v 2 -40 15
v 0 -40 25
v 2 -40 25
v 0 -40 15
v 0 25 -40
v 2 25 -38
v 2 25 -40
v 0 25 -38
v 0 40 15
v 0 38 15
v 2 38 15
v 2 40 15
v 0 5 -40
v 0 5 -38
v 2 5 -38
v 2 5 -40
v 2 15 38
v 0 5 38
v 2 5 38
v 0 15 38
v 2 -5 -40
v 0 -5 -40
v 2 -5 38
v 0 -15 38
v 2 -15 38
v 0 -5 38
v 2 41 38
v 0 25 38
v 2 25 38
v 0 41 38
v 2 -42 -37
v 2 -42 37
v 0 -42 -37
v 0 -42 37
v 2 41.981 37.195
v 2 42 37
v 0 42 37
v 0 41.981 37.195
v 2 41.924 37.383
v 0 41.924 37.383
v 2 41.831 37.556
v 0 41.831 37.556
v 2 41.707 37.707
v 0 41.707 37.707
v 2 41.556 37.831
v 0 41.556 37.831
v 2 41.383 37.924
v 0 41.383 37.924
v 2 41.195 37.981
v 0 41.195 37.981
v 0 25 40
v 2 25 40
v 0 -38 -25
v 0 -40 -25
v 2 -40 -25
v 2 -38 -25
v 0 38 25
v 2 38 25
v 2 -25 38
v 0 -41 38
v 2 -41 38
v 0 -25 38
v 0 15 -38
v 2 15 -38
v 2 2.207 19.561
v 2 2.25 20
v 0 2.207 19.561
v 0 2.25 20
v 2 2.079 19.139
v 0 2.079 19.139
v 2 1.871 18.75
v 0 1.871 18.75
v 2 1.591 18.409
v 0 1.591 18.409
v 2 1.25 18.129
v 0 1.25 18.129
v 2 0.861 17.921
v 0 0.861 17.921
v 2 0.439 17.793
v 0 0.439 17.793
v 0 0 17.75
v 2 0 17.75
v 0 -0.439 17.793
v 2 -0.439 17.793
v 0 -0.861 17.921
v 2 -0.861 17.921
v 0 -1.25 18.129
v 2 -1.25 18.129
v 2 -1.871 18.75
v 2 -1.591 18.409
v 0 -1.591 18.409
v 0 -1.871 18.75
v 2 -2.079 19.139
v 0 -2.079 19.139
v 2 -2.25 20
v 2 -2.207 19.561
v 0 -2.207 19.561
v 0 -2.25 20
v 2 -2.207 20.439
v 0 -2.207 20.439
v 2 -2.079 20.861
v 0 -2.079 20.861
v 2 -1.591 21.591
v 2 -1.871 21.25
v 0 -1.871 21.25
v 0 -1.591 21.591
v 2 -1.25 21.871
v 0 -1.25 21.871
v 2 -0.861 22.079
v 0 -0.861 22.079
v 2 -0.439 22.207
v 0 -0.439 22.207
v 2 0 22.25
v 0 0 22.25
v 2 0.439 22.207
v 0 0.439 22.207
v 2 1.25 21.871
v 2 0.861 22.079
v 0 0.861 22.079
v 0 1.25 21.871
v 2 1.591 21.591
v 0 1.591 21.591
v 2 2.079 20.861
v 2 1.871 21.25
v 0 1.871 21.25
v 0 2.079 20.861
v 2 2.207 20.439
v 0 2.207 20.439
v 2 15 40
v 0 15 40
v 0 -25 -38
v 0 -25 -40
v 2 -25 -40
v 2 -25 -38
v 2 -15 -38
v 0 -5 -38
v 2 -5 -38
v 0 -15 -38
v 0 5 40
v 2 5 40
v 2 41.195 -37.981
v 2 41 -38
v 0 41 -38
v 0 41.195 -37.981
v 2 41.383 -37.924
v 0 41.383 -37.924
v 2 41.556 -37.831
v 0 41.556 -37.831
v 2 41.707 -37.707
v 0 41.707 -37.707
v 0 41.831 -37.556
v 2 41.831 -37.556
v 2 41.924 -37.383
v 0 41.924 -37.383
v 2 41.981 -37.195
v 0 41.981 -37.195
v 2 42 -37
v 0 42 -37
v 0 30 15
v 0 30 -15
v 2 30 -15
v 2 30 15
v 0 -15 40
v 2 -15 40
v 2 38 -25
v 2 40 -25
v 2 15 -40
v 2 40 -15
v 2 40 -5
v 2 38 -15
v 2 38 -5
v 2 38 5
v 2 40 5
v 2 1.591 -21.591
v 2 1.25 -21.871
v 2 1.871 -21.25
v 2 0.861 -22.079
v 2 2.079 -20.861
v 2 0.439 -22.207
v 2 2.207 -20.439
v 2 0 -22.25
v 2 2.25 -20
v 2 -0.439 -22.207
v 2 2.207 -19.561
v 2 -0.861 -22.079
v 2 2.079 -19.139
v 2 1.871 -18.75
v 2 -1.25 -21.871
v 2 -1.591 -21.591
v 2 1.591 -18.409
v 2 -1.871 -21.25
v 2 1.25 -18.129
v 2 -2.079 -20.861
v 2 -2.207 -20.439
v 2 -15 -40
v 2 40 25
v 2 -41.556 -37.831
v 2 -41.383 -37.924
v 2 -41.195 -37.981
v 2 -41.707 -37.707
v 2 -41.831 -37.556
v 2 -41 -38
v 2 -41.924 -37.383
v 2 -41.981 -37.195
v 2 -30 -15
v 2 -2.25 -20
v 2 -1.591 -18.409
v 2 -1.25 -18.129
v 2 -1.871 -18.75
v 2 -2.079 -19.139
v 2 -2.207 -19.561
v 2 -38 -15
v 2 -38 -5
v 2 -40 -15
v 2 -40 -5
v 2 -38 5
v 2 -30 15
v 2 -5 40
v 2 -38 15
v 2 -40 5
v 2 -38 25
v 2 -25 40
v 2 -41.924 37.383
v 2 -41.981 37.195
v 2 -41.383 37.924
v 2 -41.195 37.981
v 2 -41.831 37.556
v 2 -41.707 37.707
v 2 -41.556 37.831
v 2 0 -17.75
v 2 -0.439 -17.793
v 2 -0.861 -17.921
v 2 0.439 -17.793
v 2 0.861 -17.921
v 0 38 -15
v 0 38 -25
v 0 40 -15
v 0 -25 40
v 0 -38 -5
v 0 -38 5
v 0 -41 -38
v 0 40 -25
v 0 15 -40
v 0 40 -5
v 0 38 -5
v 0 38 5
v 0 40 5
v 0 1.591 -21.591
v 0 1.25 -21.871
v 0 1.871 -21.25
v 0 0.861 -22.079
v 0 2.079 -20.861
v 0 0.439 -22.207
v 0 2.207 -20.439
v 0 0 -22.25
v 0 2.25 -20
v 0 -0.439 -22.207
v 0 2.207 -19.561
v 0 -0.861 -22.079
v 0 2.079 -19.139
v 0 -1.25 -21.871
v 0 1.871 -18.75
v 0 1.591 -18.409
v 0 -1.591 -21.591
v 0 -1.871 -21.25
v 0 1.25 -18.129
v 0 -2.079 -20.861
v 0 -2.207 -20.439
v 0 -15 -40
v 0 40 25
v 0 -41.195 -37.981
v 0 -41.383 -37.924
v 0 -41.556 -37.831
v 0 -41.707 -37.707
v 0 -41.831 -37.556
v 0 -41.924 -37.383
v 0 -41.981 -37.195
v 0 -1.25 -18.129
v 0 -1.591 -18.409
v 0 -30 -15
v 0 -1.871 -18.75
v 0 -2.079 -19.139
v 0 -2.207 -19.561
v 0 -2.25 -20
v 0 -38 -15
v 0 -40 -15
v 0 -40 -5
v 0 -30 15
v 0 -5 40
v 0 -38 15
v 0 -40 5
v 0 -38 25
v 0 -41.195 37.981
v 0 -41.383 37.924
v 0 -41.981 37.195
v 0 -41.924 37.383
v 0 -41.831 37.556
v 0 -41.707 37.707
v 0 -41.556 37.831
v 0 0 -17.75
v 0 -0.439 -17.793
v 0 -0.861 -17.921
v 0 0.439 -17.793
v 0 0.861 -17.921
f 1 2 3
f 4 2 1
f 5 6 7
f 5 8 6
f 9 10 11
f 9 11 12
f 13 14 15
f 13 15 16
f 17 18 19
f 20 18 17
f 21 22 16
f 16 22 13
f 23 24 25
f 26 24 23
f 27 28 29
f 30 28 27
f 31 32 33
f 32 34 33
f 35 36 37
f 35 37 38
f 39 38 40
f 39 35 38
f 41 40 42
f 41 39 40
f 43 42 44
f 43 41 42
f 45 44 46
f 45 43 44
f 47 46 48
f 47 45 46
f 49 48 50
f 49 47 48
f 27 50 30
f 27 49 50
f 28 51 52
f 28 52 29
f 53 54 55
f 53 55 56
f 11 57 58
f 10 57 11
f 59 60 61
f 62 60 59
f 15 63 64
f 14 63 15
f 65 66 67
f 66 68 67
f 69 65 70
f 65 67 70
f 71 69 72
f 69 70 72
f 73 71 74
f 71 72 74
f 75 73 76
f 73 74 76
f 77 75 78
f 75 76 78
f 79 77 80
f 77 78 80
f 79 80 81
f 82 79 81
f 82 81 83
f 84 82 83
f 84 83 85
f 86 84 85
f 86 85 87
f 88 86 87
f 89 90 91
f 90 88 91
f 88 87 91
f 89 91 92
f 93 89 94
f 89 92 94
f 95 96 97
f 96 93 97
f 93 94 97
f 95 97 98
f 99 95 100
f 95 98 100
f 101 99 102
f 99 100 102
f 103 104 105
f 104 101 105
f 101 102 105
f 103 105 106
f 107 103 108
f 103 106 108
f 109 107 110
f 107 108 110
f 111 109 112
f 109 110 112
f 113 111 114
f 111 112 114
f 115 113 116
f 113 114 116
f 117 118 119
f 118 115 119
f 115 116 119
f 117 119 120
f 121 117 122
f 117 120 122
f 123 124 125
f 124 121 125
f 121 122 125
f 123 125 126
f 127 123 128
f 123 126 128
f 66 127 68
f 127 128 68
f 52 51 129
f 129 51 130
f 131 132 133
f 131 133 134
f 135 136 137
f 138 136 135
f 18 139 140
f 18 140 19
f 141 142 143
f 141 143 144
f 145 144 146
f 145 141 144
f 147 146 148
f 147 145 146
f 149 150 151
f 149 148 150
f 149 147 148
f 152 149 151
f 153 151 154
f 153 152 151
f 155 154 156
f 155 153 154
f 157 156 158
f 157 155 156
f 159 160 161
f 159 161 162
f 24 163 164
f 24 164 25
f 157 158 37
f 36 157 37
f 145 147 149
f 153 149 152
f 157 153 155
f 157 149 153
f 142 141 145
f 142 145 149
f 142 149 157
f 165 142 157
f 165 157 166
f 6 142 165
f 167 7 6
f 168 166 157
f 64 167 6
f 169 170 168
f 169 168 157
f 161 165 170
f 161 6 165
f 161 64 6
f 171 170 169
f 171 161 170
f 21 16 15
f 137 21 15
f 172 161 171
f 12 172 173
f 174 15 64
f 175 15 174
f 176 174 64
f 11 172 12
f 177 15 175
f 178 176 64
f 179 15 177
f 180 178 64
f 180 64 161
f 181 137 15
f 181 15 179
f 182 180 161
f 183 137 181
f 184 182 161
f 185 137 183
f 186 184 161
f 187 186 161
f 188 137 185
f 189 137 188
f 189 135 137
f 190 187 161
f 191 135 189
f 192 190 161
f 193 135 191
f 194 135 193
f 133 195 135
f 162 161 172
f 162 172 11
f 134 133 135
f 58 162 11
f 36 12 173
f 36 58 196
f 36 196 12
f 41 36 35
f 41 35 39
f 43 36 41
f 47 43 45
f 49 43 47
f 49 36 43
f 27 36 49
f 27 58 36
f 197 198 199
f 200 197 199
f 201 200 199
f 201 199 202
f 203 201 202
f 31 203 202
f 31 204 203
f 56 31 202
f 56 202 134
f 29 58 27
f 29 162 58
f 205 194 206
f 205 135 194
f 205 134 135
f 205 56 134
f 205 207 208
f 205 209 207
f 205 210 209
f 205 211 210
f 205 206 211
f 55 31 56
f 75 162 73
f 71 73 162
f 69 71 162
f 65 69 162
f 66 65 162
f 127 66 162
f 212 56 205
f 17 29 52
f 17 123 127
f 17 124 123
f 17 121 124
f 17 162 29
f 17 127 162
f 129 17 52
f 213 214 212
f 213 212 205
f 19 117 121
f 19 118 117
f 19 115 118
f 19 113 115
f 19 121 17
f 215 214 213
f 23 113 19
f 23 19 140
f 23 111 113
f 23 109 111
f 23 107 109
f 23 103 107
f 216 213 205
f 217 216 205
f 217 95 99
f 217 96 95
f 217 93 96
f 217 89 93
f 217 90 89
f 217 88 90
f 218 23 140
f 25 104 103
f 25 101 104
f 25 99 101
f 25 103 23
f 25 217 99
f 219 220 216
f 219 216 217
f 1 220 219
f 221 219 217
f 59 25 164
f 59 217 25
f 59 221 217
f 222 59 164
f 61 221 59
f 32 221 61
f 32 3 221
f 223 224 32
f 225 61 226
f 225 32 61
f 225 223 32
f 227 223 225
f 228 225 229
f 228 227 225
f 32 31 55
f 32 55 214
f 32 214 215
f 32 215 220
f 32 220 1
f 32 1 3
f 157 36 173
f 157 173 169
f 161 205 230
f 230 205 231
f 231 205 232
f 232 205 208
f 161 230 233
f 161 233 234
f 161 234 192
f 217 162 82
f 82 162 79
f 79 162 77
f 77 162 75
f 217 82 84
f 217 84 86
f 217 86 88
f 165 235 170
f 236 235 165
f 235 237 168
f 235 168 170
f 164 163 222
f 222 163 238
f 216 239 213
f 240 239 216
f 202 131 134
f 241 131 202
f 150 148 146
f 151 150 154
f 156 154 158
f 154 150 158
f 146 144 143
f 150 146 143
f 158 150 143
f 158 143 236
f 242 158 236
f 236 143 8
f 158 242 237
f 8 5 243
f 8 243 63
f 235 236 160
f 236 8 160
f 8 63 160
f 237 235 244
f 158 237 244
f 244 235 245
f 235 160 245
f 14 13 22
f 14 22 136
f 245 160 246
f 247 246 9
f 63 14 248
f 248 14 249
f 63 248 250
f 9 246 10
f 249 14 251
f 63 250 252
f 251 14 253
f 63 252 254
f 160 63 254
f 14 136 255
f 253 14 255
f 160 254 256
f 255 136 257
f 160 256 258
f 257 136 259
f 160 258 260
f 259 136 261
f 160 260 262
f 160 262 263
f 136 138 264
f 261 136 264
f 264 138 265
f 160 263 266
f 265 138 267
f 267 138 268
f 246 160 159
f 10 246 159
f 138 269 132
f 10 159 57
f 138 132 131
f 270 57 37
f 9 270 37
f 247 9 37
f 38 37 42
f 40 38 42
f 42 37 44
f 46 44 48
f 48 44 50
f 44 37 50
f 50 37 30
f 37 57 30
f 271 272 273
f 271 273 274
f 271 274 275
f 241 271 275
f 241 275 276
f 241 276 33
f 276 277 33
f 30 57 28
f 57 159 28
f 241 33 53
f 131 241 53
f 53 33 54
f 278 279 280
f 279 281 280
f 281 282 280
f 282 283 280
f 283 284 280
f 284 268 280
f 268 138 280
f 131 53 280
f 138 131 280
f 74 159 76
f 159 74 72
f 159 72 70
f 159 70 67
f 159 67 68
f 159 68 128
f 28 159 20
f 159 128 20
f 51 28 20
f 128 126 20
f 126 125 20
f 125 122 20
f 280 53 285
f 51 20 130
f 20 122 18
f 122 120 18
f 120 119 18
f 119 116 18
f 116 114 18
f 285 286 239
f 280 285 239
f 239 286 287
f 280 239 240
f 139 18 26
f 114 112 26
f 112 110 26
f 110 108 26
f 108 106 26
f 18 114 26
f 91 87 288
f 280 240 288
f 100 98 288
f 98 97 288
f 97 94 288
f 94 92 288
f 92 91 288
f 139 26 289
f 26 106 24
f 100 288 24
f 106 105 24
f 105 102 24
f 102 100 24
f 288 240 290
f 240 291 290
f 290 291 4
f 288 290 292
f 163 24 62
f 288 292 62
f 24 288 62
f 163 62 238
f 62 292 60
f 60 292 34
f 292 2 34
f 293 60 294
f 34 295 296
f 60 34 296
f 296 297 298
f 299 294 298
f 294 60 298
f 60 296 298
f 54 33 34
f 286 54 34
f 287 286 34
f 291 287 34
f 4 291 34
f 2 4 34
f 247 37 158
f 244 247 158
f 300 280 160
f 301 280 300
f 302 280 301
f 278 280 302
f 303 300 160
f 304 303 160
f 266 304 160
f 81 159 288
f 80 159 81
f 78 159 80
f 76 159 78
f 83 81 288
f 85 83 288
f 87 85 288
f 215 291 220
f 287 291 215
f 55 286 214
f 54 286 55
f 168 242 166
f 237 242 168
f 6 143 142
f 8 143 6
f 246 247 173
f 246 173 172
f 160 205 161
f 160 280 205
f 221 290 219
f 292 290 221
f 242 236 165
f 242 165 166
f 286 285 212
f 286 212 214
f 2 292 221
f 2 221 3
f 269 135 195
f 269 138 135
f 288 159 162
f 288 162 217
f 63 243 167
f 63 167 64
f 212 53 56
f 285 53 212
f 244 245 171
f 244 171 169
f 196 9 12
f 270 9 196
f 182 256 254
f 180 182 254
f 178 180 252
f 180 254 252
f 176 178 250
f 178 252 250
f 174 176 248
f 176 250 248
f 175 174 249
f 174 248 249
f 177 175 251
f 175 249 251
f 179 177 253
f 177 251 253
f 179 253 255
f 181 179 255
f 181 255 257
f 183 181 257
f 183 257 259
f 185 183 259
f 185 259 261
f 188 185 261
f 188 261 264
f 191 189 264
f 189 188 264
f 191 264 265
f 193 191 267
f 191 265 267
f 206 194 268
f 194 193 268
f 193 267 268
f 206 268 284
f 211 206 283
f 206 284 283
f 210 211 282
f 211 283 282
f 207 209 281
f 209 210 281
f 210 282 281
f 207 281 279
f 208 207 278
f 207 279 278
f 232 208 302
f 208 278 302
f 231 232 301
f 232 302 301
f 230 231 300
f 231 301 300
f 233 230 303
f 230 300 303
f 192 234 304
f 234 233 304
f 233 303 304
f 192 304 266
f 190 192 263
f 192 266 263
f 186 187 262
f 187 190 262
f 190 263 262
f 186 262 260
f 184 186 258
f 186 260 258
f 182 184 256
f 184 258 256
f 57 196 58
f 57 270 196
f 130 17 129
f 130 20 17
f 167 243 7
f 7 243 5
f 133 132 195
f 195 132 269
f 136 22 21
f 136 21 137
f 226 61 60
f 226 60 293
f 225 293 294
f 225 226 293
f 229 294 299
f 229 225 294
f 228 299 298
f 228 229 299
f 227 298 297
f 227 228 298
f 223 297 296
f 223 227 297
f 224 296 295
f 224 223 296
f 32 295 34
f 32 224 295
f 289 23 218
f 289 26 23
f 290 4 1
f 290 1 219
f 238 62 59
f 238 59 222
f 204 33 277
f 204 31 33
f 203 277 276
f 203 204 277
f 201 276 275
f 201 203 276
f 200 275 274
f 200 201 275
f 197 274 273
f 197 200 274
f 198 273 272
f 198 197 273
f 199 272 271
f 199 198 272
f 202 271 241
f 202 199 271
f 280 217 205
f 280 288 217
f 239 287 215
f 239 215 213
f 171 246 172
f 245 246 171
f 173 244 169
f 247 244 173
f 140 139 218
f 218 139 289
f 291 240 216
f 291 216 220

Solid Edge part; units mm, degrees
sketch "Sketch1" plane through (0, 0, 0) normal (1, 0, 0) x (0, 1, 0)
  line L0 (42, -40) -> (42, 40)
  line L1 (42, 40) -> (-42, 40)
  line L2 (-42, 40) -> (-42, -40)
  line L3 (-42, -40) -> (42, -40)
extrude "Protrusion1" add sketch "Sketch1" along normal blind 2
sketch "Sketch2" plane through (0, 0, 0) normal (1, 0, 0) x (0, 1, 0)
  line L0 (-42, 38) -> (-25, 38)
  line L1 (-25, 38) -> (-25, 40)
  line L2 (-25, 40) -> (-42, 40)
  line L3 (-42, 40) -> (-42, 38)
  line L4 (-15, 38) -> (-5, 38)
  line L5 (-5, 38) -> (-5, 40)
  line L6 (-5, 40) -> (-15, 40)
  line L7 (-15, 40) -> (-15, 38)
  line L8 (5, 38) -> (15, 38)
  line L9 (15, 38) -> (15, 40)
  line L10 (15, 40) -> (5, 40)
  line L11 (5, 40) -> (5, 38)
  line L12 (25, 38) -> (42, 38)
  line L13 (42, 38) -> (42, 40)
  line L14 (42, 40) -> (25, 40)
  line L15 (25, 40) -> (25, 38)
  line L16 (40, 15) -> (40, 25)
  line L17 (40, 25) -> (38, 25)
  line L18 (38, 25) -> (38, 15)
  line L19 (38, 15) -> (40, 15)
  line L20 (38, 5) -> (38, -5)
  line L21 (38, -5) -> (40, -5)
  line L22 (40, -5) -> (40, 5)
  line L23 (40, 5) -> (38, 5)
  line L24 (38, -15) -> (38, -25)
  line L25 (38, -25) -> (40, -25)
  line L26 (40, -25) -> (40, -15)
  line L27 (40, -15) -> (38, -15)
  line L28 (42, -38) -> (25, -38)
  line L29 (25, -38) -> (25, -40)
  line L30 (25, -40) -> (42, -40)
  line L31 (42, -40) -> (42, -38)
  line L32 (15, -38) -> (5, -38)
  line L33 (5, -38) -> (5, -40)
  line L34 (5, -40) -> (15, -40)
  line L35 (15, -40) -> (15, -38)
  line L36 (-5, -38) -> (-15, -38)
  line L37 (-15, -38) -> (-15, -40)
  line L38 (-15, -40) -> (-5, -40)
  line L39 (-5, -40) -> (-5, -38)
  line L40 (-25, -38) -> (-42, -38)
  line L41 (-42, -38) -> (-42, -40)
  line L42 (-42, -40) -> (-25, -40)
  line L43 (-25, -40) -> (-25, -38)
  line L44 (-38, -25) -> (-38, -15)
  line L45 (-38, -15) -> (-40, -15)
  line L46 (-40, -15) -> (-40, -25)
  line L47 (-40, -25) -> (-38, -25)
  line L48 (-38, -5) -> (-38, 5)
  line L49 (-38, 5) -> (-40, 5)
  line L50 (-40, 5) -> (-40, -5)
  line L51 (-40, -5) -> (-38, -5)
  line L52 (-38, 15) -> (-38, 25)
  line L53 (-38, 25) -> (-40, 25)
  line L54 (-40, 25) -> (-40, 15)
  line L55 (-40, 15) -> (-38, 15)
  dimension "D1" = 17
  dimension "D2" = 2
  dimension "D3" = 10
  dimension "D4" = 2
  dimension "D5" = 10
  dimension "D6" = 2
  dimension "D7" = 17
  dimension "D8" = 2
  dimension "D9" = 17
  dimension "D10" = 2
  dimension "D11" = 10
  dimension "D12" = 2
  dimension "D13" = 10
  dimension "D14" = 2
  dimension "D15" = 17
  dimension "D16" = 2
  dimension "D17" = 2
  dimension "D18" = 10
  dimension "D19" = 2
  dimension "D20" = 10
  dimension "D21" = 2
  dimension "D22" = 10
  dimension "D23" = 2
  dimension "D24" = 10
  dimension "D25" = 2
  dimension "D26" = 10
  dimension "D27" = 2
  dimension "D28" = 10
  dimension "D29" = 10
  dimension "D30" = 10
  dimension "D31" = 10
  dimension "D32" = 10
  dimension "D33" = 10
  dimension "D34" = 10
  dimension "D35" = 2
  dimension "D36" = 15
  dimension "D37" = 2
  dimension "D38" = 10
  dimension "D39" = 15
  dimension "D40" = 2
  dimension "D41" = 10
  dimension "D42" = 2
  dimension "D43" = 2
  dimension "D44" = 2
  dimension "D45" = 10
  dimension "D46" = 15
  dimension "D47" = 10
  dimension "D48" = 15
extrude "ExtrudedCutout_29" cut sketch "Sketch2" along normal blind 2
sketch "Sketch3" plane through (0, 0, 0) normal (1, 0, 0) x (0, 1, 0)
  line L0 (30, 15) -> (-30, 15)
  line L1 (-30, 15) -> (-30, -15)
  line L2 (-30, -15) -> (30, -15)
  line L3 (30, -15) -> (30, 15)
extrude "ExtrudedCutout_30" cut sketch "Sketch3" along normal blind 2
sketch "Sketch4" plane through (0, 0, 0) normal (1, 0, 0) x (0, 1, 0)
  circle A0 centre (0, 20) radius 2.25
  circle A1 centre (0, -20) radius 2.25
  dimension "D1" = 4.5
  dimension "D2" = 4.5
  dimension "D3" = 20
  dimension "D4" = 20
  dimension "D5" = 60
  dimension "D6" = 30
  dimension "D7" = 15
  dimension "D8" = 30
extrude "ExtrudedCutout_31" cut sketch "Sketch4" along normal blind 2
fillet "Round_1" radius 1 4 edges at (1, -42, -38) (1, 42, -38) (1, 42, 38) (1, -42, 38)
properties material "Acrylic, high impact grade"
